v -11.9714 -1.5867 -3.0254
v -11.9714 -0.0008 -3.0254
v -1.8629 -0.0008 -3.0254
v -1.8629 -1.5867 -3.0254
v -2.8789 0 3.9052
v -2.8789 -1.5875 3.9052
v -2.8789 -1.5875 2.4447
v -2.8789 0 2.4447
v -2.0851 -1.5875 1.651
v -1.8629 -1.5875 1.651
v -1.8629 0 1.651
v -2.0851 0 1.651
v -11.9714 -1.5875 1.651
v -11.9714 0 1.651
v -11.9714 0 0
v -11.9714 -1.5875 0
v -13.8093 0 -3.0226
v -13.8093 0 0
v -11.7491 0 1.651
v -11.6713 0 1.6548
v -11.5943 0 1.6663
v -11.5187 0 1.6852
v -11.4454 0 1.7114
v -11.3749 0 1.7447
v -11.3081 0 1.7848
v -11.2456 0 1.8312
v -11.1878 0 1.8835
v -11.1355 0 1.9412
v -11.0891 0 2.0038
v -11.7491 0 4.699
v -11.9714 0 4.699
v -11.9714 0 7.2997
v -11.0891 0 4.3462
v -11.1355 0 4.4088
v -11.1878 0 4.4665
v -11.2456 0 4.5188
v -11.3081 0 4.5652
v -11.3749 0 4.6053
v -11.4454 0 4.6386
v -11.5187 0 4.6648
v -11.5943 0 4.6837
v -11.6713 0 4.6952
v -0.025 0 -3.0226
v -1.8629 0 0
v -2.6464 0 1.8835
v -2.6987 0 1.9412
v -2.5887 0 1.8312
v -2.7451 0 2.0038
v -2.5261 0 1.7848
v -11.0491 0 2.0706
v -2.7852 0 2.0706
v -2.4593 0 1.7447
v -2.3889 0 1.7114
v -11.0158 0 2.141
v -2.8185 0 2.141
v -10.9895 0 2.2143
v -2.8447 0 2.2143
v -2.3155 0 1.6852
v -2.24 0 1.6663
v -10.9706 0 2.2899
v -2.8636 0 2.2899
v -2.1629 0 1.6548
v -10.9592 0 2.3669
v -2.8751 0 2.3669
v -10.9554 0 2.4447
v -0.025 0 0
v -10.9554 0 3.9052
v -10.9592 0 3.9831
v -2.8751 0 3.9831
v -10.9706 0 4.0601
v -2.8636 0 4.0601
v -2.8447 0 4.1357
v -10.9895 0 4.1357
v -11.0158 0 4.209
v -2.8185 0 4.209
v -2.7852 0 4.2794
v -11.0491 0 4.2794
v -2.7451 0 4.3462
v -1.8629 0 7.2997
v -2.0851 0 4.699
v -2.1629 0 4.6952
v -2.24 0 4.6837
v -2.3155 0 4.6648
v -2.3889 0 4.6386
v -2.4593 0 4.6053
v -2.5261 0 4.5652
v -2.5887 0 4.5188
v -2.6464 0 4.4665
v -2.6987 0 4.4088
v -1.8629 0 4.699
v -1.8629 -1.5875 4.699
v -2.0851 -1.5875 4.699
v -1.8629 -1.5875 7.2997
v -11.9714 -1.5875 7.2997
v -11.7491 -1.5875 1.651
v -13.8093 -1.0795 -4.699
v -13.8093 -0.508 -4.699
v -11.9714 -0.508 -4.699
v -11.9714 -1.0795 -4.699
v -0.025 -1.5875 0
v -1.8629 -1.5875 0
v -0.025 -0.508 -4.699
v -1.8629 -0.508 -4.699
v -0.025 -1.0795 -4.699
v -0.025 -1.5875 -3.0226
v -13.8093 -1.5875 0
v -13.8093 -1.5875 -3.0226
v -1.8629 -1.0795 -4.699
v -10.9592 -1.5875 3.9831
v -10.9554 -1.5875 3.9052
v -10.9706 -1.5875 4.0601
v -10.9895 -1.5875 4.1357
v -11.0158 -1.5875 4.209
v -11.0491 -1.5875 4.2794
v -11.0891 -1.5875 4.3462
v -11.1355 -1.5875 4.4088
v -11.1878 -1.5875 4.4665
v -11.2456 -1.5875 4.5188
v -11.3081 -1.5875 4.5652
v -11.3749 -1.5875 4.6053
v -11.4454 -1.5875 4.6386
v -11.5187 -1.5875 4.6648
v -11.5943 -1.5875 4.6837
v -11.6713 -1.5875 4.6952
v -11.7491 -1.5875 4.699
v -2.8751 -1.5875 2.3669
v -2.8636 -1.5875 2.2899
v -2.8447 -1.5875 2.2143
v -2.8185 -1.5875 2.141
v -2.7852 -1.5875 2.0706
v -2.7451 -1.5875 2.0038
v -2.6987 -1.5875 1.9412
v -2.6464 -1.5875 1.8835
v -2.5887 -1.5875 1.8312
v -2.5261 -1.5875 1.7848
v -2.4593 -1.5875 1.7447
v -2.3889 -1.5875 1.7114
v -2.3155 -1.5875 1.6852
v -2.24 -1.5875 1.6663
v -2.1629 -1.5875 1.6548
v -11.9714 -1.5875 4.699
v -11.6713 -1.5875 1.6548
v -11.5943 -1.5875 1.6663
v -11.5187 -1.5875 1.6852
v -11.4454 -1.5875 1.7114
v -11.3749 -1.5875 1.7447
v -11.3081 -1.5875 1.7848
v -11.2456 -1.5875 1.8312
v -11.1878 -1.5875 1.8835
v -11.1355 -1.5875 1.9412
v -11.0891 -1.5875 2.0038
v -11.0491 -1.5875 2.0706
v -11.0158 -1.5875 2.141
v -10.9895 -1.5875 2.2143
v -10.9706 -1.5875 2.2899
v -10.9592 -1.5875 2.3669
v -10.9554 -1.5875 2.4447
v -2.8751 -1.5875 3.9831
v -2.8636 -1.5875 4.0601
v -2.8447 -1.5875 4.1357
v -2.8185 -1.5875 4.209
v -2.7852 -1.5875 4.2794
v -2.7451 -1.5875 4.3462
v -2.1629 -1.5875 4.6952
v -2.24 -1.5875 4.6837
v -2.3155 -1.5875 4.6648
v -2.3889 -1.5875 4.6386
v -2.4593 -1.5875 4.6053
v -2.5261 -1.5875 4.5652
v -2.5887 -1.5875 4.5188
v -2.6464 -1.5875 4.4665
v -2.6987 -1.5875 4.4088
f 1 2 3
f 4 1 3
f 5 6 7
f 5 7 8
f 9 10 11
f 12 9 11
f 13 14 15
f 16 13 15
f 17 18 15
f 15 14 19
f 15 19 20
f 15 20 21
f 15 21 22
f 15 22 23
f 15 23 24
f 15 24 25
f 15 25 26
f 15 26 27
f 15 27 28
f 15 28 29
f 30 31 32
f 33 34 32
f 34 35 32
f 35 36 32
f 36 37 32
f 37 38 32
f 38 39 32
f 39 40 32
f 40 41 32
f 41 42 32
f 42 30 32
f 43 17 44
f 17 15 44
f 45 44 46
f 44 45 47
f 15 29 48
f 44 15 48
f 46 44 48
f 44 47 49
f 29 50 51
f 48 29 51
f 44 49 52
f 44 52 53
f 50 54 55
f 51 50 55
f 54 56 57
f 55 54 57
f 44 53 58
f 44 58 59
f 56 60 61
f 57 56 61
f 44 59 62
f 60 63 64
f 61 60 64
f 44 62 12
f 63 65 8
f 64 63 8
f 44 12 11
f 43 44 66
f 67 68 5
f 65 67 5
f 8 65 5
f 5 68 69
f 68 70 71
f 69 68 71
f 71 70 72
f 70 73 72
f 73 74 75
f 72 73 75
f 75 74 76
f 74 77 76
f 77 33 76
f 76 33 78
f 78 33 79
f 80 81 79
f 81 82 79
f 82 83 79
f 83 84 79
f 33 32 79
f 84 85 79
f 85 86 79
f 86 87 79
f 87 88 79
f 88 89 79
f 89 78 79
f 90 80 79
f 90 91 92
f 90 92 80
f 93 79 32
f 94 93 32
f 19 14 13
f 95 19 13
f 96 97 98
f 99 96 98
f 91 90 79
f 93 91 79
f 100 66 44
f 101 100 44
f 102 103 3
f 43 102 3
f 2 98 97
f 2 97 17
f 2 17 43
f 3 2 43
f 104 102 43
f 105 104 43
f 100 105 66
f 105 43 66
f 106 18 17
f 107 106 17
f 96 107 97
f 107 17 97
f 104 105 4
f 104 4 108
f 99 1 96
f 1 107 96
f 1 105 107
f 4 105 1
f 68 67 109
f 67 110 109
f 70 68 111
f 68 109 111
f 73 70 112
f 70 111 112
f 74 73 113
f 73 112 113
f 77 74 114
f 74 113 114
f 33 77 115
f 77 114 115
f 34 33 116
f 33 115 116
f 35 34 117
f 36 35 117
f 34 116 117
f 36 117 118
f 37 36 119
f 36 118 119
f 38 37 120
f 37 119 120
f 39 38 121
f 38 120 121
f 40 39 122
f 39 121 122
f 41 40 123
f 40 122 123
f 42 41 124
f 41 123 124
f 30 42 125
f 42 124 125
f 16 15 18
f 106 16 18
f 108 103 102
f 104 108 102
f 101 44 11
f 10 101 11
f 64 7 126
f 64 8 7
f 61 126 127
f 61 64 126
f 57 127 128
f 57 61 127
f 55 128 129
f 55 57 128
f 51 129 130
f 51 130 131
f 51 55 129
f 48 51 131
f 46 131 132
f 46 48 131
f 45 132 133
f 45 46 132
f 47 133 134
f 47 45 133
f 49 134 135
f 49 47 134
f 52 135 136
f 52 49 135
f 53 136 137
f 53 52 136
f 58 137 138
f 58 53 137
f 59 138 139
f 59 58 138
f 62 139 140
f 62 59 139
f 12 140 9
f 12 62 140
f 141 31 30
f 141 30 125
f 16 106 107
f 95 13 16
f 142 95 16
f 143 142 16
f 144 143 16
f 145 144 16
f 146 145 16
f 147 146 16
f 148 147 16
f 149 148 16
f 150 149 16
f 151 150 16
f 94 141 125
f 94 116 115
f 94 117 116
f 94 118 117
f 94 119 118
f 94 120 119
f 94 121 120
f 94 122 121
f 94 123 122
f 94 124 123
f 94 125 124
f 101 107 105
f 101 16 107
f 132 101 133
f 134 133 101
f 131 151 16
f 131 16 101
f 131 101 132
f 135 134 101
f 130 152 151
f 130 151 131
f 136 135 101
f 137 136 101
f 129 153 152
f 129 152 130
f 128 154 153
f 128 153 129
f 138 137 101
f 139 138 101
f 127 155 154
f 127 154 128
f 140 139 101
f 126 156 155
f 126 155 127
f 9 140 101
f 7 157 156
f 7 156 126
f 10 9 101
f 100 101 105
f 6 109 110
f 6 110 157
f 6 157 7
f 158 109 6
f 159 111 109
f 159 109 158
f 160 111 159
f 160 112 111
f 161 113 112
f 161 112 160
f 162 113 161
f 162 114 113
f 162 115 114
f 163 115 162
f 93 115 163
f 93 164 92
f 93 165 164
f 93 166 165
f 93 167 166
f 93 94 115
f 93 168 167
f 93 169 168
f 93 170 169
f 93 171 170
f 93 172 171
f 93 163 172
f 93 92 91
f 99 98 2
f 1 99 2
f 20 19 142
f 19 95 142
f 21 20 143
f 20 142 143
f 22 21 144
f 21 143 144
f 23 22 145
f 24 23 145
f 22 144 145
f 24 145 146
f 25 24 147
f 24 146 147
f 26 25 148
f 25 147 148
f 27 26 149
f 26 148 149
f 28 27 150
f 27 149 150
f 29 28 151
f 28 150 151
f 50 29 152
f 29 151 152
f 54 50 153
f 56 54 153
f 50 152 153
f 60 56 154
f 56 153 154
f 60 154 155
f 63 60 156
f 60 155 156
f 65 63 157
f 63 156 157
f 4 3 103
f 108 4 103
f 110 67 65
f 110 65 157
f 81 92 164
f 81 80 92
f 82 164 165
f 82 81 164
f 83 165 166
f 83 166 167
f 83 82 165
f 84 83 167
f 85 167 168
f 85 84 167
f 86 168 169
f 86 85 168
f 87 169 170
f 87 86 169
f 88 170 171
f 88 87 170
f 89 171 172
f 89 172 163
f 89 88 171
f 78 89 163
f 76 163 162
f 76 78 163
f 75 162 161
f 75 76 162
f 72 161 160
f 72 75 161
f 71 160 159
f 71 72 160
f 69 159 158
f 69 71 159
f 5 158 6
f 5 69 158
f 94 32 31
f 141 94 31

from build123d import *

# Parameters (mm, degrees)
F1_DEPTH  = 1.5875
F3_DEPTH  = 25.4
F4_W      = 1.5875
F4_H      = 3.048
F5_DEPTH  = 1.016
F6_R      = 0.79375
F7_W      = 1.5875
F7_H      = 3.048
F8_DEPTH  = 1.016
F9_R      = 0.79375
F10_DEPTH = 0.254


with BuildPart() as f1:
    # F0 (on Front) → F1 (new body)
    with BuildSketch(Plane.XZ):
        Polygon((-11.9713607894, 7.553705716), (-11.9713607894, 0), (-13.8092668185, 0), (-13.8092668185, -4.699), (-11.9713607894, -4.699), (-11.9713607894, -3.025394284), (-1.862878878, -3.025394284), (-1.862878878, -4.699), (-0.0249728489, -4.699), (-0.0249728489, 0), (-1.862878878, 0), (-1.862878878, 7.553705716), align=None)
    extrude(amount=F1_DEPTH)

    # F2 (on face) → F3 (cut)
    with BuildSketch(Plane(origin=(-13.8092668185, 0, 0), x_dir=(0, -1, 0), z_dir=(-1, 0, 0))):
        Polygon((0.508, -4.699), (0, -3.0226), (0, -4.699), align=None)
        Polygon((1.5875, -3.0226), (1.0795, -4.699), (1.5875, -4.699), align=None)
    extrude(amount=-F3_DEPTH, mode=Mode.SUBTRACT)

    # F4 (on face) → F5 (cut)
    with BuildSketch(Plane.YZ.offset(-1.862878878)):
        with Locations((-0.79375, 3.175)):
            Rectangle(F4_W, F4_H)
    extrude(amount=-F5_DEPTH, mode=Mode.SUBTRACT)

    # F6
    f6_edges = [f1.edges().sort_by_distance(p)[0] for p in [
        (-2.878879, -0.79375, 4.699),
        (-2.878879, -0.79375, 1.651),
    ]]
    fillet(f6_edges, radius=F6_R)

    # F7 (on face) → F8 (cut)
    with BuildSketch(Plane(origin=(-11.9713607894, 0, 0), x_dir=(0, -1, 0), z_dir=(-1, 0, 0))):
        with Locations((0.79375, 3.175)):
            Rectangle(F7_W, F7_H)
    extrude(amount=-F8_DEPTH, mode=Mode.SUBTRACT)

    # F9
    f9_edges = [f1.edges().sort_by_distance(p)[0] for p in [
        (-10.955361, -0.79375, 4.699),
        (-10.955361, -0.79375, 1.651),
    ]]
    fillet(f9_edges, radius=F9_R)

    # F10 (cut): a face of the model
    f10_faces = [f1.faces().sort_by_distance(p)[0] for p in [
        (-6.9171198337, -0.79375, 7.553705716),
    ]]
    extrude(f10_faces, amount=-F10_DEPTH, mode=Mode.SUBTRACT)


solid = f1.part
